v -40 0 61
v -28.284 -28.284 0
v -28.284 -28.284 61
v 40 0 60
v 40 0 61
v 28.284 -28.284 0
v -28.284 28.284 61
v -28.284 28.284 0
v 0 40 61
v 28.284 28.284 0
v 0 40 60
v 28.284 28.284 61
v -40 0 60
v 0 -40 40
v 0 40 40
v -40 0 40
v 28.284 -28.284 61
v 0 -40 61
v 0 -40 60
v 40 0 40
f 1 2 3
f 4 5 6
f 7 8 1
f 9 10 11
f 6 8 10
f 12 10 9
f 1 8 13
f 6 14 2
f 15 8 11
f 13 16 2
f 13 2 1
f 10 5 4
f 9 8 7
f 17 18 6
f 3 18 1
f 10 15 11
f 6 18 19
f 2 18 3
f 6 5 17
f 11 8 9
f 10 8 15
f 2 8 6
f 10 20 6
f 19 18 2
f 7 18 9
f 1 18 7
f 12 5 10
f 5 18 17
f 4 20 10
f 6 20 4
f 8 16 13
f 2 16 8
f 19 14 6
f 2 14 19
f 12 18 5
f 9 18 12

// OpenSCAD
glarch(60, 40, 60);

module glarch(h, r) {
    $fn = 4;
    hull() {
        // 9/9
        translate([0, 0, h*3/3]) rotate([0, 0, 45]) cylinder(h = 1, r = r, $fn = 8);
        // 8/9
        translate([0, 0, h*2/3]) cylinder(h = 1, r = r, $fn = 8);
        // 7/9
        // 6/9
        translate([0, 0, h*0/3]) rotate([0, 0, 45]) cylinder(h = 1, r = r);
    }
}
